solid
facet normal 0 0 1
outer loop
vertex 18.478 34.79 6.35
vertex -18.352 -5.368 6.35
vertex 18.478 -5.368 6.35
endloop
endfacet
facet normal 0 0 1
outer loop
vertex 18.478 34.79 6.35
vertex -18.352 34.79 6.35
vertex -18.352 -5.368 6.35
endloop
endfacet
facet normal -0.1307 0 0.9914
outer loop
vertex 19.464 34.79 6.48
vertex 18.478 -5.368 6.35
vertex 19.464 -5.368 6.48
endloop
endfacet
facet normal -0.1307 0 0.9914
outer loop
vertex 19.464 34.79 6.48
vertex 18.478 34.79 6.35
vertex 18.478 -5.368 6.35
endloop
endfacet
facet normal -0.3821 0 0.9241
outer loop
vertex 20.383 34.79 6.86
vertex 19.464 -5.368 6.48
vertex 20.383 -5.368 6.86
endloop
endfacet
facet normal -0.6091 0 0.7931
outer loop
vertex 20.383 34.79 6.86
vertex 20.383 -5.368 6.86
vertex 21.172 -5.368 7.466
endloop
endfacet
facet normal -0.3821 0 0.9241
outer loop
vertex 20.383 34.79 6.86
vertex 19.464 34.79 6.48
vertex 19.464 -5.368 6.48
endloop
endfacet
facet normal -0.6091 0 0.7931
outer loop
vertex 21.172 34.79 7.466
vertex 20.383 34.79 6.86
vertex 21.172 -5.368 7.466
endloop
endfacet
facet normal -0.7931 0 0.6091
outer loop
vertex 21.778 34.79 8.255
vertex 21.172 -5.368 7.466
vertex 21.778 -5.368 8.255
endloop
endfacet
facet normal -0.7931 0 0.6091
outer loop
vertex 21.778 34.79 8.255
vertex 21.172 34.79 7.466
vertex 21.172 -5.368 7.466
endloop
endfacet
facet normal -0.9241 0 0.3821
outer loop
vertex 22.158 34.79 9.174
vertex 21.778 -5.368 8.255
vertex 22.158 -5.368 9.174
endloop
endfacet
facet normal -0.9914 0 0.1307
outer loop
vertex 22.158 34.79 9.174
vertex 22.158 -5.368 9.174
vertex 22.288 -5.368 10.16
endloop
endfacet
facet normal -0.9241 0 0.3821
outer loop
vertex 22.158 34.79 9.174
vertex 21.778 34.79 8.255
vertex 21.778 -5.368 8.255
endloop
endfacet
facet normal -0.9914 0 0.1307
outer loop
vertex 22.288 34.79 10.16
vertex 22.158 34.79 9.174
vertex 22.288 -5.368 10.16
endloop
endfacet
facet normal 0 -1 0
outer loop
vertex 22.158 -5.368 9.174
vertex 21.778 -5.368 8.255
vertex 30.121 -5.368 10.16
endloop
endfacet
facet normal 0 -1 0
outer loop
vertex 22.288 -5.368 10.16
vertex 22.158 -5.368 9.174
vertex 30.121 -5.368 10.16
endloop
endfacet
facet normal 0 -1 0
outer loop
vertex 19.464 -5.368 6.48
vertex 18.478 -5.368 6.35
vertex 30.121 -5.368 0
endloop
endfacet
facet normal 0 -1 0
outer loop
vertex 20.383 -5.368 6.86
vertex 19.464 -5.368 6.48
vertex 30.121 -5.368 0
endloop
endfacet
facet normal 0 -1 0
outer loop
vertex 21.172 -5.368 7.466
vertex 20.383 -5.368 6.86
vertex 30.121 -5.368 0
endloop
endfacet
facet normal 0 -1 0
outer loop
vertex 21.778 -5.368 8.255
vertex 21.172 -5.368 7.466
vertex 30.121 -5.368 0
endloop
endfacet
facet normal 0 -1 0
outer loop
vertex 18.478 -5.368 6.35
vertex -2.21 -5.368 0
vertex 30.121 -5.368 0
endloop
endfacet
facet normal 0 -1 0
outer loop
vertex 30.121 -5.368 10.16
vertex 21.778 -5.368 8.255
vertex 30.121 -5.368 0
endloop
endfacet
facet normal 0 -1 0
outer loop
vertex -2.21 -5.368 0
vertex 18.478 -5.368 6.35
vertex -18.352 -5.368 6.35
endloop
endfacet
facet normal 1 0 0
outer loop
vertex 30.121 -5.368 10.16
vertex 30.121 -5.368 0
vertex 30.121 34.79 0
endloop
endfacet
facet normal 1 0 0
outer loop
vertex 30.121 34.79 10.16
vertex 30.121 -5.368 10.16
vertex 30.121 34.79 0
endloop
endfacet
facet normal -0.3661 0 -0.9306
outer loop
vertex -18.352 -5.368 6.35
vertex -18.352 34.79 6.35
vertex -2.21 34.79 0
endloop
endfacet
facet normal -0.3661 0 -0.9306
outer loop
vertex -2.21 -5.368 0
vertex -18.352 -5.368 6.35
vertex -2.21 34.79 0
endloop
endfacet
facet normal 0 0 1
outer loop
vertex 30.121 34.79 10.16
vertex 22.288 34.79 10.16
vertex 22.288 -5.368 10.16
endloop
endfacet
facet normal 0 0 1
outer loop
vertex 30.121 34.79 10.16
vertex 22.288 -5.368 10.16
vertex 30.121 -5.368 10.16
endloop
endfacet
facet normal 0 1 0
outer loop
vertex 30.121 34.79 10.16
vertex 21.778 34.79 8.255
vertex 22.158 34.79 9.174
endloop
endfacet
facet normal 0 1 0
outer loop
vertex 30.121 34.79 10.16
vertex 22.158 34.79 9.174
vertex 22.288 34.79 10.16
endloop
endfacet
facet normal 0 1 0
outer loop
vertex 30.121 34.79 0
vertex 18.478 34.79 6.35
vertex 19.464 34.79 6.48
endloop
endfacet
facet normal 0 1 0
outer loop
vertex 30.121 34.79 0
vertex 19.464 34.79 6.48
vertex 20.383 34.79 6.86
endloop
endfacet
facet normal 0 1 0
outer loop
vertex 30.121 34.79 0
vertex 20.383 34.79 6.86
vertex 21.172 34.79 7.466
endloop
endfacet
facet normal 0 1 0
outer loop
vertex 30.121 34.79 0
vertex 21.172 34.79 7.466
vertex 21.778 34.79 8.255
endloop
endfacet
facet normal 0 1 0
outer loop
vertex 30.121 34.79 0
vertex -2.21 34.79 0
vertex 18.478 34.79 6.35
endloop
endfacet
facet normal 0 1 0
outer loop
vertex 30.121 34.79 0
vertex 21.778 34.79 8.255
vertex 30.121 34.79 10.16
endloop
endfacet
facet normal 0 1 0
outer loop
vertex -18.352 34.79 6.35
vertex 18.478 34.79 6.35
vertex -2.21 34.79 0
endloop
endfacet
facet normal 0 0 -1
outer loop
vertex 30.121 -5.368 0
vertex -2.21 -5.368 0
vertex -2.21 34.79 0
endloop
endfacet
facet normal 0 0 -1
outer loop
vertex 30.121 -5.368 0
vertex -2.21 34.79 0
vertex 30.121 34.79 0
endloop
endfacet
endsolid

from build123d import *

# Parameters (mm, degrees)
SKETCH1_W           = 48.472676838
SKETCH1_H           = 40.157820008
BOSS_EXTRUDE1_DEPTH = 12.7
SKETCH3_W           = 40.64
SKETCH3_H           = 40.157820008
CUT_EXTRUDE2_DEPTH  = 6.35
FILLET7_R           = 3.81
SKETCH4_W           = 7.832676838
SKETCH4_H           = 40.157820008
CUT_EXTRUDE3_DEPTH  = 2.54
CUT_EXTRUDE4_DEPTH  = 129.54


with BuildPart() as part:
    # Sketch1 → Boss-Extrude1 (new body)
    with BuildSketch(Plane.XY):
        with Locations((5.884543073, 14.710946933)):
            Rectangle(SKETCH1_W, SKETCH1_H)
    extrude(amount=BOSS_EXTRUDE1_DEPTH)

    # Sketch3 → Cut-Extrude2 (cut)
    with BuildSketch(Plane.XY.offset(12.7)):
        with Locations((1.968204654, 14.710946933)):
            Rectangle(SKETCH3_W, SKETCH3_H)
    extrude(amount=-CUT_EXTRUDE2_DEPTH, mode=Mode.SUBTRACT)

    # Fillet7
    fillet7_edges = [part.edges().sort_by_distance(p)[0] for p in [
        (22.288204654, 14.710946933, 6.35),
    ]]
    fillet(fillet7_edges, radius=FILLET7_R)

    # Sketch4 → Cut-Extrude3 (cut)
    with BuildSketch(Plane.XY.offset(12.7)):
        with Locations((26.204543073, 14.710946933)):
            Rectangle(SKETCH4_W, SKETCH4_H)
    extrude(amount=-CUT_EXTRUDE3_DEPTH, mode=Mode.SUBTRACT)

    # Sketch5 → Cut-Extrude4 (cut)
    with BuildSketch(Plane(origin=(0, 34.789856937, 0), x_dir=(1, 0, 0), z_dir=(0, 1, 0))):
        Polygon((-18.351795346, 0), (-18.351795346, -6.35), (-2.210194986, 0), align=None)
    extrude(amount=-CUT_EXTRUDE4_DEPTH, mode=Mode.SUBTRACT)


solid = part.part
